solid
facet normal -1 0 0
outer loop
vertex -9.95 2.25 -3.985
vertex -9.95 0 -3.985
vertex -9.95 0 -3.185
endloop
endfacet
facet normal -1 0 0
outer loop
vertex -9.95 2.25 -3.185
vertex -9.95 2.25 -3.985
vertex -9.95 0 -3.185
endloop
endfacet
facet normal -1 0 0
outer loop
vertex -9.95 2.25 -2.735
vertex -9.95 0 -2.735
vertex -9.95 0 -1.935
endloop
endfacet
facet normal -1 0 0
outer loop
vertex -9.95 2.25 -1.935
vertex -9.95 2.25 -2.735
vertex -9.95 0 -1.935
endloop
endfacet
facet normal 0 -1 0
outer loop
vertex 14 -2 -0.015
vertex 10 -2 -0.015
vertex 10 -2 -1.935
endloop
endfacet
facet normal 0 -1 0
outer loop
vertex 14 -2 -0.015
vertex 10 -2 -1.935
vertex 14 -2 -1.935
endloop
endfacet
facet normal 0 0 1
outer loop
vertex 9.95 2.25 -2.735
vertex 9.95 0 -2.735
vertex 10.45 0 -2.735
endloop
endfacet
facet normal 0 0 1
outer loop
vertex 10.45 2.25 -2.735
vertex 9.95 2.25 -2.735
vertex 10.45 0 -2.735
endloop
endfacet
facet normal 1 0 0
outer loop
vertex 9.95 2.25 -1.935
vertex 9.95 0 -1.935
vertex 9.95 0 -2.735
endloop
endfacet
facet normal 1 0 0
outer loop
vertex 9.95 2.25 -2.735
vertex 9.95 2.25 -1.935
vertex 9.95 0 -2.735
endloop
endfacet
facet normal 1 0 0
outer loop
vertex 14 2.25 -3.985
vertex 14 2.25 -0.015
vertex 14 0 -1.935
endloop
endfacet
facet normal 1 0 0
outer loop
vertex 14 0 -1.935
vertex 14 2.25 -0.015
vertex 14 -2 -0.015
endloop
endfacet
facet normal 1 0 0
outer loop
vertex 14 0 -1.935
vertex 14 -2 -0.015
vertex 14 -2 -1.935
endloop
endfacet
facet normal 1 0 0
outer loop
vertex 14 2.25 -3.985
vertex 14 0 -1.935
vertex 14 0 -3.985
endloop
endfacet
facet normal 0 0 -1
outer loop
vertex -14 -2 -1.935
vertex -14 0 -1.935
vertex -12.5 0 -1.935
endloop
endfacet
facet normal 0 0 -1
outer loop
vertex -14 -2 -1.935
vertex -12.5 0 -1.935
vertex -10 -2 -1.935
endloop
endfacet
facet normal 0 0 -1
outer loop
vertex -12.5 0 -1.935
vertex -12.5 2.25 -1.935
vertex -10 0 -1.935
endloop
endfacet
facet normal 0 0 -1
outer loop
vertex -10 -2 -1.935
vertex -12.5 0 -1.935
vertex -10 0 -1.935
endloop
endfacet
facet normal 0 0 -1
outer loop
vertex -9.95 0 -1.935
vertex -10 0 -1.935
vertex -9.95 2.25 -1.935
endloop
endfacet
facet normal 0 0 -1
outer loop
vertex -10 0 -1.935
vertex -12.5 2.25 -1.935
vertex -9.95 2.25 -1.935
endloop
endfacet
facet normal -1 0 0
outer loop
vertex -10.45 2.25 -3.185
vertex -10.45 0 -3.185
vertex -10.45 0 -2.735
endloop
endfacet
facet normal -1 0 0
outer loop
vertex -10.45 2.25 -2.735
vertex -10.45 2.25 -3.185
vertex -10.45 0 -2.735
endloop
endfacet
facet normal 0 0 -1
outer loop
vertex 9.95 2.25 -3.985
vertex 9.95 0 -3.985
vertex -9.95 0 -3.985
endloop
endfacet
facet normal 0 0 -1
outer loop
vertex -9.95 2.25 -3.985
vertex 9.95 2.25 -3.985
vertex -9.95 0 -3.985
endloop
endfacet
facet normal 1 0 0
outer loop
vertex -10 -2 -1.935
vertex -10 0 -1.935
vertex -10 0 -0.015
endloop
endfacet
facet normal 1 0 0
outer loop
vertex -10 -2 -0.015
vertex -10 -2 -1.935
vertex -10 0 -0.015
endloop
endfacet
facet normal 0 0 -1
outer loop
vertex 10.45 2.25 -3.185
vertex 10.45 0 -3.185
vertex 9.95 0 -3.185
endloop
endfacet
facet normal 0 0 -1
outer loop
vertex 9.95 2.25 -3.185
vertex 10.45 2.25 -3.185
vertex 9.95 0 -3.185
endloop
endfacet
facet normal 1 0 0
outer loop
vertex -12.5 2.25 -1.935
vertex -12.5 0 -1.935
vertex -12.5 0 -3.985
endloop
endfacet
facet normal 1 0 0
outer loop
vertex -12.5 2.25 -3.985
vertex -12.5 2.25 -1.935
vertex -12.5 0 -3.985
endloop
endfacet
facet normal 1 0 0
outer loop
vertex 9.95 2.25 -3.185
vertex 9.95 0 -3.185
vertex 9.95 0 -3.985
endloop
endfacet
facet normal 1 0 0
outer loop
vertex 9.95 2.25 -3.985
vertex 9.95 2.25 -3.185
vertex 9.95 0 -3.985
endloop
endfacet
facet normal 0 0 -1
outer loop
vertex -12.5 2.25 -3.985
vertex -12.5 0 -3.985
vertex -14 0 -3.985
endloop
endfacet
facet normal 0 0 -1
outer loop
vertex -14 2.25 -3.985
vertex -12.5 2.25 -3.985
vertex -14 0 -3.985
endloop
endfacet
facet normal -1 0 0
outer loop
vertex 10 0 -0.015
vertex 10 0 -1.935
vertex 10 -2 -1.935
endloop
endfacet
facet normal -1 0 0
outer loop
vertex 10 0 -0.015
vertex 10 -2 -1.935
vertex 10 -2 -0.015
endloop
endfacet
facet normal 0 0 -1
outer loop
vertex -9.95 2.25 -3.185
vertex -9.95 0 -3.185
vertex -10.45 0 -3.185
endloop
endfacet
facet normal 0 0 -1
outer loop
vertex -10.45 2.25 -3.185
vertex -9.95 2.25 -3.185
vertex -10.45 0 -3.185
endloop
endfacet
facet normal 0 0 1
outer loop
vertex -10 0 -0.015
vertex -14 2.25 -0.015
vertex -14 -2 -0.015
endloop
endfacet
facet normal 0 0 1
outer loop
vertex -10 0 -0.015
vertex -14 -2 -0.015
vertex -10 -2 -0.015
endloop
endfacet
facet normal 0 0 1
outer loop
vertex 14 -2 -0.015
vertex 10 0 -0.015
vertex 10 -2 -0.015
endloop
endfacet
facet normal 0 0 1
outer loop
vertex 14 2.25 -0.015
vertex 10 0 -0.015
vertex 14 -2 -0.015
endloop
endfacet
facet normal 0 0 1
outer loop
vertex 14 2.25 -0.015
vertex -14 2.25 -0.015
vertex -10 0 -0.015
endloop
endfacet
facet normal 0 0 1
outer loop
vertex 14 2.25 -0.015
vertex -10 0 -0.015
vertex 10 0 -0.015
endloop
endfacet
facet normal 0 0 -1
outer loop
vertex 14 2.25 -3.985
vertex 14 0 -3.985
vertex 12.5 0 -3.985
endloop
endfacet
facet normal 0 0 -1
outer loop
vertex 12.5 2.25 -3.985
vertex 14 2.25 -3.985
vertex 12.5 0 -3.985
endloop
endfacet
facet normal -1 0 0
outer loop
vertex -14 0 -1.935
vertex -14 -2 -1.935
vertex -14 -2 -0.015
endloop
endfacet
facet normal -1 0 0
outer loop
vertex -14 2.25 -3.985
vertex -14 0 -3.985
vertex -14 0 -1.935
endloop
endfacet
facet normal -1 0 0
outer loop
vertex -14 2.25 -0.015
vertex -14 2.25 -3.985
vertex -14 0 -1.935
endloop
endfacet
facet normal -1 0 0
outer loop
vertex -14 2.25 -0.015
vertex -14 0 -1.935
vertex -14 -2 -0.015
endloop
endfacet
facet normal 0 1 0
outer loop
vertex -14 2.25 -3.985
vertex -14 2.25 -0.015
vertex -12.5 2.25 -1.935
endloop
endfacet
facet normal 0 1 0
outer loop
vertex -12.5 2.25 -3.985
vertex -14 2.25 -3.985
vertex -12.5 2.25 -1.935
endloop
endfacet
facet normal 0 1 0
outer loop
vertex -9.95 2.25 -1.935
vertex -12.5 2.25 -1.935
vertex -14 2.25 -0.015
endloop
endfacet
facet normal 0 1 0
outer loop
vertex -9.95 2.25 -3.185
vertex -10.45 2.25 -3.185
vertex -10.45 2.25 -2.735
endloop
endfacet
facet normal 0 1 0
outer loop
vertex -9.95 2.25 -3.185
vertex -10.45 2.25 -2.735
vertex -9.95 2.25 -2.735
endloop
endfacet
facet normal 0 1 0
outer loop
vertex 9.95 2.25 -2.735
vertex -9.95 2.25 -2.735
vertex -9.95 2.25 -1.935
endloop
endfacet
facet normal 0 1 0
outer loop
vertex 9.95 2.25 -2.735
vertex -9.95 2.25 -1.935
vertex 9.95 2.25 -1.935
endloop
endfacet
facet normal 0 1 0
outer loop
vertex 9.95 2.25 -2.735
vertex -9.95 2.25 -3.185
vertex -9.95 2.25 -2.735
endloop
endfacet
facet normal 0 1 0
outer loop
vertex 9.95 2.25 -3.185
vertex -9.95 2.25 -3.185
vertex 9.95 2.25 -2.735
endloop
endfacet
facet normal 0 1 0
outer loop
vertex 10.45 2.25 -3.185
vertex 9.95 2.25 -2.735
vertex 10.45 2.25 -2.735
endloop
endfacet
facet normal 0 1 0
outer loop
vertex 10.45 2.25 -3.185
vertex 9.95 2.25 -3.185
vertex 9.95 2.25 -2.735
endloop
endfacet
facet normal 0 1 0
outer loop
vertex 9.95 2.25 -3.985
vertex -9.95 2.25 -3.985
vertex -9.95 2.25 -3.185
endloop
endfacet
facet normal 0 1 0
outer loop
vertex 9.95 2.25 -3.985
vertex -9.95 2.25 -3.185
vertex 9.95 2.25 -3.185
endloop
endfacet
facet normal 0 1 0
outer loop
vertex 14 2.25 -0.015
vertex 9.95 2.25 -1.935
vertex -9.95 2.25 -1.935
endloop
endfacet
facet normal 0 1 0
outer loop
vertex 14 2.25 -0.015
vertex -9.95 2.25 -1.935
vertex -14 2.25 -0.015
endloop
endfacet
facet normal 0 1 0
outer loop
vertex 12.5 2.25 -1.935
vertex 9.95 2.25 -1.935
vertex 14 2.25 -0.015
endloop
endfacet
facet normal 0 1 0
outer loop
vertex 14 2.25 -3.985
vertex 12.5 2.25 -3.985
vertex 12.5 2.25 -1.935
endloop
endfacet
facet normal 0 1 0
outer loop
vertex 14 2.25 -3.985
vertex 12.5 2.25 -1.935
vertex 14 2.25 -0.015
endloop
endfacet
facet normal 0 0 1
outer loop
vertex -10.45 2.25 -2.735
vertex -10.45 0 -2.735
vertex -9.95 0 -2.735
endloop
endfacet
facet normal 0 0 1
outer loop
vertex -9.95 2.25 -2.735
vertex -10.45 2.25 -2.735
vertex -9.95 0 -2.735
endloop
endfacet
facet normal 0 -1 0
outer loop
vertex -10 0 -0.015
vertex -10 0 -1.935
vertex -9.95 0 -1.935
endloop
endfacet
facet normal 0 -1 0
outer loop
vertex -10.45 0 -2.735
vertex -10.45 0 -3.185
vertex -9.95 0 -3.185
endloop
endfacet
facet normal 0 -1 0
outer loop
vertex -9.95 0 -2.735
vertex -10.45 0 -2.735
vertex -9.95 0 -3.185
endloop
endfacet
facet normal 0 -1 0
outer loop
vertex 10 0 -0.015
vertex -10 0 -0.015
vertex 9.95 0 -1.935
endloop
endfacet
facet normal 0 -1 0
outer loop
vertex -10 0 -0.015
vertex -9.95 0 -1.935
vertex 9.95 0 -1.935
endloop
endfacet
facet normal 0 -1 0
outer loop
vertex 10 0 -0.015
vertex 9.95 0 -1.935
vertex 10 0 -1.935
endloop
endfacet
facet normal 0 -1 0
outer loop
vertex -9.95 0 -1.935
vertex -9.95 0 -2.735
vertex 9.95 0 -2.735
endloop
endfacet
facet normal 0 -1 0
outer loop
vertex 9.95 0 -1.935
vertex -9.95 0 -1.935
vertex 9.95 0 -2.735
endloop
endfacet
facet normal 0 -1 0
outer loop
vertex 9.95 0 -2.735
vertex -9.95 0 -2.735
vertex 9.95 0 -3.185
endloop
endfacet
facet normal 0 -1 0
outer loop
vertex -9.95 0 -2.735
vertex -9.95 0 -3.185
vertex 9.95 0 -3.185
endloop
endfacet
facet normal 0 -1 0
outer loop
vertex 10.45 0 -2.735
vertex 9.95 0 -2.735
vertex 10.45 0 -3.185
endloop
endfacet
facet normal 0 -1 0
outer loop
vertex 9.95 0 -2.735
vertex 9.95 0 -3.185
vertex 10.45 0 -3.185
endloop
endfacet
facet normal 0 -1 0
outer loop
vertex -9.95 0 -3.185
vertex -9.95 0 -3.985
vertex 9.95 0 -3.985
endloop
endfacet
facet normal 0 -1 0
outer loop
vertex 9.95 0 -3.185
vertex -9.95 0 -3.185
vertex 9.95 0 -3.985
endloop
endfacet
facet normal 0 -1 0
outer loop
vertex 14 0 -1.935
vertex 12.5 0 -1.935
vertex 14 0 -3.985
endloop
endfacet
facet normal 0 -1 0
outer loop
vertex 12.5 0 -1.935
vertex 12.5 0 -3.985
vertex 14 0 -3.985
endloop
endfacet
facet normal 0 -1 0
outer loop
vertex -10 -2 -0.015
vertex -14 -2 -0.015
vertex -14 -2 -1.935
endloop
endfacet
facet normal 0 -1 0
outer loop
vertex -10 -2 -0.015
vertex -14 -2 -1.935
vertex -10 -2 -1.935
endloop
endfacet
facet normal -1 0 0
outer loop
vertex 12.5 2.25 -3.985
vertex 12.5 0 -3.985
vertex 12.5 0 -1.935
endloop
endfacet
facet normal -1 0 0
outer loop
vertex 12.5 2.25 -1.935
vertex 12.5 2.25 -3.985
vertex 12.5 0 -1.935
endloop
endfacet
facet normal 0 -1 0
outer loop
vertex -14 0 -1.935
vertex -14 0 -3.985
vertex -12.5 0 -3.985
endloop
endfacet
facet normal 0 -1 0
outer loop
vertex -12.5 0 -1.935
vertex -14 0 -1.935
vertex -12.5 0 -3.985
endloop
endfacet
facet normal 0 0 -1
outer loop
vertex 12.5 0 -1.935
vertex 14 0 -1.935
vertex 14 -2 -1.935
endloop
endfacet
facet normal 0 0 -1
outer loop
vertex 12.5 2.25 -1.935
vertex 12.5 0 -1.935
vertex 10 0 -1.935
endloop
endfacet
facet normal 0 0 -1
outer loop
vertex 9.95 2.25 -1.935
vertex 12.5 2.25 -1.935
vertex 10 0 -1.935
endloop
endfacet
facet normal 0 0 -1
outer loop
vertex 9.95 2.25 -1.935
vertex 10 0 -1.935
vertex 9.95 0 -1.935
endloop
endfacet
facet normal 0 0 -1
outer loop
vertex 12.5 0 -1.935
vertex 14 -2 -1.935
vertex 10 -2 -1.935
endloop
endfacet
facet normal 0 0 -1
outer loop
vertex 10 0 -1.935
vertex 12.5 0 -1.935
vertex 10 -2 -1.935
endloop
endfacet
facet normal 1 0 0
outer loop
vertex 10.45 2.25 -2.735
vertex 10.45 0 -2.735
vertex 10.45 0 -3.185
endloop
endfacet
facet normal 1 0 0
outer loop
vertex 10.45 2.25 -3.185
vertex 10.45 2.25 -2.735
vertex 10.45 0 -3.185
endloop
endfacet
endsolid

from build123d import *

# Parameters (mm, degrees)
Y_KSEKLIK_EKSTR_ZYON1_DEPTH = 2.25
IZIM5_W                     = 4
IZIM5_H                     = 1.92
Y_KSEKLIK_EKSTR_ZYON4_DEPTH = 2


with BuildPart() as part:
    # Çizim1 → Yükseklik-Ekstrüzyon1 (new body)
    with BuildSketch(Plane(origin=(0, 0, 0), x_dir=(1, 0, 0), z_dir=(0, 1, 0))):
        Polygon((-14, 3.985440092), (-14, 0.015440092), (14, 0.015440092), (14, 3.985440092), (12.5, 3.985440092), (12.5, 1.935440092), (9.95, 1.935440092), (9.95, 2.735440092), (10.45, 2.735440092), (10.45, 3.185440092), (9.95, 3.185440092), (9.95, 3.985440092), (-9.95, 3.985440092), (-9.95, 3.185440092), (-10.45, 3.185440092), (-10.45, 2.735440092), (-9.95, 2.735440092), (-9.95, 1.935440092), (-12.5, 1.935440092), (-12.5, 3.985440092), align=None)
    extrude(amount=Y_KSEKLIK_EKSTR_ZYON1_DEPTH)

    # Çizim5 → Yükseklik-Ekstrüzyon4 (add)
    with BuildSketch(Plane.XZ):
        with Locations((-12, -0.975440092)):
            Rectangle(IZIM5_W, IZIM5_H)
        with Locations((12, -0.975440092)):
            Rectangle(IZIM5_W, IZIM5_H)
    extrude(amount=Y_KSEKLIK_EKSTR_ZYON4_DEPTH)


solid = part.part
